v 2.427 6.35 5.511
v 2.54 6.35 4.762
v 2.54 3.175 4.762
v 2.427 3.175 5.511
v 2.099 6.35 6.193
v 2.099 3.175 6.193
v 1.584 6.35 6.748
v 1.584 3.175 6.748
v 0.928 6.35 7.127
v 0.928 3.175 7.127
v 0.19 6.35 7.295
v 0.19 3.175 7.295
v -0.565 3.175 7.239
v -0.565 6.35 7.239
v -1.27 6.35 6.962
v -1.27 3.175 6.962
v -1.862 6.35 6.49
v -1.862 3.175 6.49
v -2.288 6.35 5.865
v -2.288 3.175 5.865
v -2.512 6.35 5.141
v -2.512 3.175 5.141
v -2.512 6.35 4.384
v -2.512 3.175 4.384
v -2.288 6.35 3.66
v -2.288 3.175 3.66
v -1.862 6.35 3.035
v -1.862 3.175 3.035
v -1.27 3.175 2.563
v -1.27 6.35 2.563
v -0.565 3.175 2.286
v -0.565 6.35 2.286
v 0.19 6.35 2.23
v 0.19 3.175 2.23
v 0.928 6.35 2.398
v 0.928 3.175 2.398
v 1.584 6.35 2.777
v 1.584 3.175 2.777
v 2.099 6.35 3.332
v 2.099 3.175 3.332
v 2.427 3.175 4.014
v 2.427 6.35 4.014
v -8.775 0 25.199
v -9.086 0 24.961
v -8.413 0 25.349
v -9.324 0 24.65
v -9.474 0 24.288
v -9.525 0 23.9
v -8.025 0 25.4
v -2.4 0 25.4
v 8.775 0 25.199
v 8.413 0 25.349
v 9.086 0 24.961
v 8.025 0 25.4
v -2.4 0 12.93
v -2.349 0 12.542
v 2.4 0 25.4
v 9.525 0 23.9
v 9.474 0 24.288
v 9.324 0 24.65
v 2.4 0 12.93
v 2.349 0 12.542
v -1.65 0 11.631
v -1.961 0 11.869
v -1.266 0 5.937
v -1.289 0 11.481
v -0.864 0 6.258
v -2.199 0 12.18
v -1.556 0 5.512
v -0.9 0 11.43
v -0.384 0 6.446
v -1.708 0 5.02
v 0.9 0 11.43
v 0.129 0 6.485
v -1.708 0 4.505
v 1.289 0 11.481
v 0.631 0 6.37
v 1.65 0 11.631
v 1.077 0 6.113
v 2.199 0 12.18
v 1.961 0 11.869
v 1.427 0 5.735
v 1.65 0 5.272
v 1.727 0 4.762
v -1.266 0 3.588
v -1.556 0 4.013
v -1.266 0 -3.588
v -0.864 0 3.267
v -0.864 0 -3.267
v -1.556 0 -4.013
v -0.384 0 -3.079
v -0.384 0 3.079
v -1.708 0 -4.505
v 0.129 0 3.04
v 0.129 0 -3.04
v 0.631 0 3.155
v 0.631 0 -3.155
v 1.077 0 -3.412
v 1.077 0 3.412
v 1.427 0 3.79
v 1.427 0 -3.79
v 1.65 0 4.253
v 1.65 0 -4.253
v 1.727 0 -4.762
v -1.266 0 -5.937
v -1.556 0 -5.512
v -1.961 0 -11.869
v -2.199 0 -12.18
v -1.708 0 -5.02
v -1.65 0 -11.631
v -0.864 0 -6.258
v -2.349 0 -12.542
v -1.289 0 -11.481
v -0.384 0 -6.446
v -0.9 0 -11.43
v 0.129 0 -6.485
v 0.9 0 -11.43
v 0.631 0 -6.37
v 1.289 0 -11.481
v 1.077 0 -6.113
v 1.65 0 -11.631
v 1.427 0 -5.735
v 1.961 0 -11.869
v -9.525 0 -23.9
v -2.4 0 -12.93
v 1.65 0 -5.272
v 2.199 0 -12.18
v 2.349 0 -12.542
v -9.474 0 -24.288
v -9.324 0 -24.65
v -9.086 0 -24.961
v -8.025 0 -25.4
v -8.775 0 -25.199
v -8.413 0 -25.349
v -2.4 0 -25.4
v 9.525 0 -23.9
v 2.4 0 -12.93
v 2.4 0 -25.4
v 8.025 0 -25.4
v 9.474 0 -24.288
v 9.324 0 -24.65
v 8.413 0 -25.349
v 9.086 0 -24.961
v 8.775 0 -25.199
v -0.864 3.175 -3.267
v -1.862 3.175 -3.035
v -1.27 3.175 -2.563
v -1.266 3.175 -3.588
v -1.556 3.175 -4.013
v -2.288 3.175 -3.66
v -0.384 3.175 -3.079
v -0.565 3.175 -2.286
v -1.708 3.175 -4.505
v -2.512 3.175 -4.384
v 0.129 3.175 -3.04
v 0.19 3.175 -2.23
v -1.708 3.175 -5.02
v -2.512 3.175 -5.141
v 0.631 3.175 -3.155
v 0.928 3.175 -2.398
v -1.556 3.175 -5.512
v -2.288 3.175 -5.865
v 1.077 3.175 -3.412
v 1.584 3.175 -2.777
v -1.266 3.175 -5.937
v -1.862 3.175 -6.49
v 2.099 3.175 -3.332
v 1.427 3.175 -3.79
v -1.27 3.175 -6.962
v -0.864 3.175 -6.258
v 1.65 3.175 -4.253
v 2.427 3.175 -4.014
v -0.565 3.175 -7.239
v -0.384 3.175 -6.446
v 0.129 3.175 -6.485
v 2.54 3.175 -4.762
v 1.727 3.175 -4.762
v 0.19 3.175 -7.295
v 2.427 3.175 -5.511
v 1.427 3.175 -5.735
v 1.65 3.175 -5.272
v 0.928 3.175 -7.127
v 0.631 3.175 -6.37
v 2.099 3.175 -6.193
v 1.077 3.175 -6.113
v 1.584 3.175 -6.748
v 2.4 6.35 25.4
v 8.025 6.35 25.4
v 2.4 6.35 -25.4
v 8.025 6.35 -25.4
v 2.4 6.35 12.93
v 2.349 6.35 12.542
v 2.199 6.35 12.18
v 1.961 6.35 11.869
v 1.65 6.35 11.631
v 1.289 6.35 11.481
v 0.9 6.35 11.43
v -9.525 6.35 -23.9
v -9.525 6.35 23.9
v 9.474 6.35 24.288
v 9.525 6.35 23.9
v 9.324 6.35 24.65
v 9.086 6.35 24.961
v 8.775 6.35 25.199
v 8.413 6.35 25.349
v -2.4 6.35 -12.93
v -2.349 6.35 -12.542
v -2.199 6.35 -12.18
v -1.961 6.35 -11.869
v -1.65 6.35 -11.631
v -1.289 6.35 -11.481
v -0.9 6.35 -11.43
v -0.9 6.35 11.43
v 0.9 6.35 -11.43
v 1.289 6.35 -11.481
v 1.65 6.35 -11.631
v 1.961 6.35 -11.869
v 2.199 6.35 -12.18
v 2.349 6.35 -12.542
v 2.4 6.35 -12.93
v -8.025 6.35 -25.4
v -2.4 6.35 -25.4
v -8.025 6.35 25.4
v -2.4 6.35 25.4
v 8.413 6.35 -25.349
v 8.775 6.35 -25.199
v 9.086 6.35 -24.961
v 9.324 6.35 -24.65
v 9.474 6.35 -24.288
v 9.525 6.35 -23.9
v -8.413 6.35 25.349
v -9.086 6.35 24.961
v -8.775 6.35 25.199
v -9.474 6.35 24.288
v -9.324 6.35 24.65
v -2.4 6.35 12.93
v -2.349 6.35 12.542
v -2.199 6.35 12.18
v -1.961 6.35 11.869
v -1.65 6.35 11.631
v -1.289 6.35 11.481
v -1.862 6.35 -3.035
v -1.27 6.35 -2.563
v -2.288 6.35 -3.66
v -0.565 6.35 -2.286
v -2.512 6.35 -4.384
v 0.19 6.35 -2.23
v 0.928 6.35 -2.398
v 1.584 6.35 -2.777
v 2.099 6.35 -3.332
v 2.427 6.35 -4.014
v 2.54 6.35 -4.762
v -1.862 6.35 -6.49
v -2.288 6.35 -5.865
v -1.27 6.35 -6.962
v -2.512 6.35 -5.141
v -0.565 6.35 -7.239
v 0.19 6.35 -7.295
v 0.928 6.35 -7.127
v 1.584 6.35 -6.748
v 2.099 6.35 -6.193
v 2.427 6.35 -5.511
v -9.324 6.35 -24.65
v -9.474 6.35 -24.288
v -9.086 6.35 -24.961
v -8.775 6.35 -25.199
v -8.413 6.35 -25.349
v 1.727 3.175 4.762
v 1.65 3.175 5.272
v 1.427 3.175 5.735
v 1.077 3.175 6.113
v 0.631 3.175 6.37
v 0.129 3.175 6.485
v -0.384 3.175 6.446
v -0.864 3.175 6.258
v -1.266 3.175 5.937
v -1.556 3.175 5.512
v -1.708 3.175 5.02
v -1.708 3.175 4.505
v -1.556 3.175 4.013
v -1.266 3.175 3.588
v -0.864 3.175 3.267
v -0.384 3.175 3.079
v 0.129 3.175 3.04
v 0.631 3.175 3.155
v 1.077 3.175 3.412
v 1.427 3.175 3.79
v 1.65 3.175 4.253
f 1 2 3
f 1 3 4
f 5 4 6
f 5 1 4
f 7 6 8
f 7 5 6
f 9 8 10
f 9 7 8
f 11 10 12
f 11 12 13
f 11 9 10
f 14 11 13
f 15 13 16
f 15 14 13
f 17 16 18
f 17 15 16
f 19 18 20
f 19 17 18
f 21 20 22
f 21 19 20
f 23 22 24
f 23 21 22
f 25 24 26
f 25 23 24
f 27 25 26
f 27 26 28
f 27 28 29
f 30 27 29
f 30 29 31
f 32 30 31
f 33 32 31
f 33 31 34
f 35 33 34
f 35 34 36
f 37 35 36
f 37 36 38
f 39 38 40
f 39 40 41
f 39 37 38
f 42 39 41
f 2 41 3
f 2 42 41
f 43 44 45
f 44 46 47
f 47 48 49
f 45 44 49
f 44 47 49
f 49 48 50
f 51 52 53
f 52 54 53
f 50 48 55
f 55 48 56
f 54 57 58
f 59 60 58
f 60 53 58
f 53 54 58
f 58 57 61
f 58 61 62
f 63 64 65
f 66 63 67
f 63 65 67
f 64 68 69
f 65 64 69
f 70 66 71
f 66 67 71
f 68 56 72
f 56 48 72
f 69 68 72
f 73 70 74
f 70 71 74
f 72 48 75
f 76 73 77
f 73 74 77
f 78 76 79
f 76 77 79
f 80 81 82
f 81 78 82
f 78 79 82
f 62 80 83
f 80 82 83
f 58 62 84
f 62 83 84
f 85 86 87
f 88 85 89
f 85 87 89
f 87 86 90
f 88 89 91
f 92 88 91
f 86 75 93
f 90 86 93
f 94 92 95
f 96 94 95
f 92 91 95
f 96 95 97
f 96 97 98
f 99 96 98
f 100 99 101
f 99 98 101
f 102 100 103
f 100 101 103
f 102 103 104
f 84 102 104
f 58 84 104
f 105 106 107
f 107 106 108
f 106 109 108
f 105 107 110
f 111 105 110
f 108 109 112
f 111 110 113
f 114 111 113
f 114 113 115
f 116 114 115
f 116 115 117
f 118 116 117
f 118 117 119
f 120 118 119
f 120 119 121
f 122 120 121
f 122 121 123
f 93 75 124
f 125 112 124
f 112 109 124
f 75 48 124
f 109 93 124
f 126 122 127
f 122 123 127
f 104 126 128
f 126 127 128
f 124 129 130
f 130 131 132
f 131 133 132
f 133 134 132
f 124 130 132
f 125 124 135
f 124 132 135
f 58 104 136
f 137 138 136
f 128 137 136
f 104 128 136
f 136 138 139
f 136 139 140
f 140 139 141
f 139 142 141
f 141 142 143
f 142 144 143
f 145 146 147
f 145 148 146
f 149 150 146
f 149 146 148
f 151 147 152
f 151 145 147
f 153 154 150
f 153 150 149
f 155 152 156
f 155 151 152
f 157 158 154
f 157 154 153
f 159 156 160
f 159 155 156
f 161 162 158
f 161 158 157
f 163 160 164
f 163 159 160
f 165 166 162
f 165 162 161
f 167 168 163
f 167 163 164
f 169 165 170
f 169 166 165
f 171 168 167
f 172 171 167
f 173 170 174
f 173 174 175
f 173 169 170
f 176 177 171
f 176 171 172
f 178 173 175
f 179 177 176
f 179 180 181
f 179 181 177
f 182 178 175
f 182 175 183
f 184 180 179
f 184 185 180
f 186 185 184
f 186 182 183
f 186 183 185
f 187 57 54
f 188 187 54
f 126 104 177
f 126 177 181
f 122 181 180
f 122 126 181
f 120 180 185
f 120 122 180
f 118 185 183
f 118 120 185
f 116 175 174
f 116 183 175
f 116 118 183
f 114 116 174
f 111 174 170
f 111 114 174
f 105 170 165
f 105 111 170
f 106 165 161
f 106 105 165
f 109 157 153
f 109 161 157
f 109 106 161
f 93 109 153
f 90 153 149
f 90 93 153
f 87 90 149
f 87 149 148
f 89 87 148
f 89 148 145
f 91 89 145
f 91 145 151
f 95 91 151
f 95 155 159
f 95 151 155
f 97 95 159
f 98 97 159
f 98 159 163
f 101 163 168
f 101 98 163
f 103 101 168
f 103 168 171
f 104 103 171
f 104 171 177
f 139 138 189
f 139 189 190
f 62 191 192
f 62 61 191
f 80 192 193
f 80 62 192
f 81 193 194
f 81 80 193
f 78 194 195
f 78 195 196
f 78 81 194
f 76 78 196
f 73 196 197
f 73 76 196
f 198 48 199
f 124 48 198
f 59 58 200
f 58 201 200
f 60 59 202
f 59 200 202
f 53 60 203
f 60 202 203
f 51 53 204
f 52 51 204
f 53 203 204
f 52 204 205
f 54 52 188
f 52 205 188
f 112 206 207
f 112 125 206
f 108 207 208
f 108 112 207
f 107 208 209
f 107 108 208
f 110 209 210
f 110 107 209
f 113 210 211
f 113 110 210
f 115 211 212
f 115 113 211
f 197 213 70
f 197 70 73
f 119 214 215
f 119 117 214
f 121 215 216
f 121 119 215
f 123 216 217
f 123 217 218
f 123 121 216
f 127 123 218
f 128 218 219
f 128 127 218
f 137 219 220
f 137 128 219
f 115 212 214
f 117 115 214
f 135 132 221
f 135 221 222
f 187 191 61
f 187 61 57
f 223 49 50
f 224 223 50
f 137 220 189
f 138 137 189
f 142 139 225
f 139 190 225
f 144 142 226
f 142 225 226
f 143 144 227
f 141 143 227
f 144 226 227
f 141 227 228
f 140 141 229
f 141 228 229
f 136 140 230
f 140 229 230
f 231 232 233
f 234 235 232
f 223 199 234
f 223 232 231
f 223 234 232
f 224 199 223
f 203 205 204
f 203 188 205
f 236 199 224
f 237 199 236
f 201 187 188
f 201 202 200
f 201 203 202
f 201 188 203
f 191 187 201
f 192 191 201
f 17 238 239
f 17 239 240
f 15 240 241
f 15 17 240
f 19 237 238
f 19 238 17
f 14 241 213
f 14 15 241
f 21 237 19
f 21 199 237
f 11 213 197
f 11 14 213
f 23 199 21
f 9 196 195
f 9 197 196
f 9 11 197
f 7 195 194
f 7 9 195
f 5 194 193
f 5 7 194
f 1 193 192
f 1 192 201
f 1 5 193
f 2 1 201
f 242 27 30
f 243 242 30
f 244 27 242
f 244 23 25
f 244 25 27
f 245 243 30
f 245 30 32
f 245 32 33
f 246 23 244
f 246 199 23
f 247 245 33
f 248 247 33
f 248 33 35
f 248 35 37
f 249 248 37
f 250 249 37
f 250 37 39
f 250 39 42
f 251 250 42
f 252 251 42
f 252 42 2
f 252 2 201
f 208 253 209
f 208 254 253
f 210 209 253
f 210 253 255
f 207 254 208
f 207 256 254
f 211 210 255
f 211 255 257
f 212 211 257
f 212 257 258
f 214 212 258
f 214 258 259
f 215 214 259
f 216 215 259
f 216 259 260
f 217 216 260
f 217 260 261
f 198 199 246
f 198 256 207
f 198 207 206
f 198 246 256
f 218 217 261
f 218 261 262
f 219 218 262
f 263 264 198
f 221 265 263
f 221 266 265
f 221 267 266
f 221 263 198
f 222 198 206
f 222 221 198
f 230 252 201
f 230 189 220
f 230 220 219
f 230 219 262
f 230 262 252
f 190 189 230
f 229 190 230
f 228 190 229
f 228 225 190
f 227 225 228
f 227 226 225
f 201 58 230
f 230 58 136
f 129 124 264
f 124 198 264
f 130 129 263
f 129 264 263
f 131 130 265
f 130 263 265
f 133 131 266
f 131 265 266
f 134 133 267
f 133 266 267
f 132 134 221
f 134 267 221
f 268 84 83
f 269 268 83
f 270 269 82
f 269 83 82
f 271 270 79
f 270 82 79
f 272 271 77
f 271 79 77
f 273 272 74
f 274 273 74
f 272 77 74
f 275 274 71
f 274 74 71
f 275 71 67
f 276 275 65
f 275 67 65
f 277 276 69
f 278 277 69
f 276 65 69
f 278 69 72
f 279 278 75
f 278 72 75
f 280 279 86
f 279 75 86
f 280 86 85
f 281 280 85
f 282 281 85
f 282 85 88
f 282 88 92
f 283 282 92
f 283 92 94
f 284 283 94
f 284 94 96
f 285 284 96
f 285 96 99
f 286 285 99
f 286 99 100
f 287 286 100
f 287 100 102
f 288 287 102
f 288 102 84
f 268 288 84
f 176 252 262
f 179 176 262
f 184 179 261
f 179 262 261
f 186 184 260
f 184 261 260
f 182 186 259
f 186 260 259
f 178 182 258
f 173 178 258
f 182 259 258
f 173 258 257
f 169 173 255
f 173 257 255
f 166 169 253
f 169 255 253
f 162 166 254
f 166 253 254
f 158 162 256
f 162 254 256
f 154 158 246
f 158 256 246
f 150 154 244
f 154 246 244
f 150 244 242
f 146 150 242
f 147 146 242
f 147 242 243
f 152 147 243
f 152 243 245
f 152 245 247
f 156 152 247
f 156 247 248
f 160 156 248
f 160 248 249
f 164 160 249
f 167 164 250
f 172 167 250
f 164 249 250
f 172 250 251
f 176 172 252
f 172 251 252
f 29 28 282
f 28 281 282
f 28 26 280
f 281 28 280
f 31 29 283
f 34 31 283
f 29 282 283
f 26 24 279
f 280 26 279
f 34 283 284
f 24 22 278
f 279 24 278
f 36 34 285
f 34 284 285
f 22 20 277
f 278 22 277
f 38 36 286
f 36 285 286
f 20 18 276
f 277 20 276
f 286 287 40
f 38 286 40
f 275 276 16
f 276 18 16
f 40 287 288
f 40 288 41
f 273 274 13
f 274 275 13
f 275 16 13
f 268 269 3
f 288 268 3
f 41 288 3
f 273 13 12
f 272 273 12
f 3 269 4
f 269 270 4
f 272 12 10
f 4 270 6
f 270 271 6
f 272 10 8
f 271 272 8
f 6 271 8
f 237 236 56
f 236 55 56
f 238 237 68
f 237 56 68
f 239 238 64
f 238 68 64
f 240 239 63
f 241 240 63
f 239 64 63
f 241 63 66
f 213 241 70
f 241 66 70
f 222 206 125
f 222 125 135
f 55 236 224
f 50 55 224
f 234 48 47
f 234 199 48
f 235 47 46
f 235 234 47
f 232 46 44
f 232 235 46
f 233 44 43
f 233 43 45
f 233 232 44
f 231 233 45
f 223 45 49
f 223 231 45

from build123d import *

# Parameters (mm, degrees)
SKETCH1_W           = 19.05
SKETCH1_H           = 50.8
BOSS_EXTRUDE1_DEPTH = 6.35
CUT_EXTRUDE1_START  = -7.35
SKETCH2_R           = 1.7272
CUT_EXTRUDE1_DEPTH  = 8.35
SKETCH3_R           = 2.54
CUT_EXTRUDE2_DEPTH  = 3.175
SKETCH4_W           = 4.8006
SKETCH4_H           = 13.97
CUT_EXTRUDE3_DEPTH  = 7.35
FILLET2_R           = 1.5


with BuildPart() as part:
    # Sketch1 → Boss-Extrude1 (new body)
    with BuildSketch(Plane(origin=(0, 0, 0), x_dir=(1, 0, 0), z_dir=(0, 1, 0))):
        Rectangle(SKETCH1_W, SKETCH1_H)
    extrude(amount=BOSS_EXTRUDE1_DEPTH)

    # Sketch2 → Cut-Extrude1 (cut)
    with BuildSketch(Plane(origin=(0, 6.35, 0), x_dir=(1, 0, 0), z_dir=(0, 1, 0)).offset(CUT_EXTRUDE1_START)):
        with Locations((0, 4.7625)):
            Circle(SKETCH2_R)
    cut_extrude1 = extrude(amount=CUT_EXTRUDE1_DEPTH, mode=Mode.SUBTRACT)

    # Sketch3 → Cut-Extrude2 (cut)
    with BuildSketch(Plane(origin=(0, 6.35, 0), x_dir=(1, 0, 0), z_dir=(0, 1, 0))):
        with Locations((0, 4.7625)):
            Circle(SKETCH3_R)
    cut_extrude2 = extrude(amount=-CUT_EXTRUDE2_DEPTH, mode=Mode.SUBTRACT)

    # Sketch4 → Cut-Extrude3 (cut, through all)
    with BuildSketch(Plane(origin=(0, 6.35, 0), x_dir=(1, 0, 0), z_dir=(0, 1, 0))):
        with Locations((0, 18.415)):
            Rectangle(SKETCH4_W, SKETCH4_H)
    cut_extrude3 = extrude(amount=-CUT_EXTRUDE3_DEPTH, mode=Mode.SUBTRACT)

    # Mirror1: Cut-Extrude1, Cut-Extrude2, Cut-Extrude3 across plane
    add(cut_extrude1.mirror(Plane.XY), mode=Mode.SUBTRACT)
    add(cut_extrude2.mirror(Plane.XY), mode=Mode.SUBTRACT)
    add(cut_extrude3.mirror(Plane.XY), mode=Mode.SUBTRACT)

    # Fillet2
    fillet2_edges = [part.edges().sort_by_distance(p)[0] for p in [
        (2.4003, 3.175, -11.43),
        (-2.4003, 3.175, -11.43),
        (2.4003, 3.175, 11.43),
        (-2.4003, 3.175, 11.43),
        (9.525, 3.175, 25.4),
        (-9.525, 3.175, 25.4),
        (-9.525, 3.175, -25.4),
        (9.525, 3.175, -25.4),
    ]]
    fillet(fillet2_edges, radius=FILLET2_R)


solid = part.part
